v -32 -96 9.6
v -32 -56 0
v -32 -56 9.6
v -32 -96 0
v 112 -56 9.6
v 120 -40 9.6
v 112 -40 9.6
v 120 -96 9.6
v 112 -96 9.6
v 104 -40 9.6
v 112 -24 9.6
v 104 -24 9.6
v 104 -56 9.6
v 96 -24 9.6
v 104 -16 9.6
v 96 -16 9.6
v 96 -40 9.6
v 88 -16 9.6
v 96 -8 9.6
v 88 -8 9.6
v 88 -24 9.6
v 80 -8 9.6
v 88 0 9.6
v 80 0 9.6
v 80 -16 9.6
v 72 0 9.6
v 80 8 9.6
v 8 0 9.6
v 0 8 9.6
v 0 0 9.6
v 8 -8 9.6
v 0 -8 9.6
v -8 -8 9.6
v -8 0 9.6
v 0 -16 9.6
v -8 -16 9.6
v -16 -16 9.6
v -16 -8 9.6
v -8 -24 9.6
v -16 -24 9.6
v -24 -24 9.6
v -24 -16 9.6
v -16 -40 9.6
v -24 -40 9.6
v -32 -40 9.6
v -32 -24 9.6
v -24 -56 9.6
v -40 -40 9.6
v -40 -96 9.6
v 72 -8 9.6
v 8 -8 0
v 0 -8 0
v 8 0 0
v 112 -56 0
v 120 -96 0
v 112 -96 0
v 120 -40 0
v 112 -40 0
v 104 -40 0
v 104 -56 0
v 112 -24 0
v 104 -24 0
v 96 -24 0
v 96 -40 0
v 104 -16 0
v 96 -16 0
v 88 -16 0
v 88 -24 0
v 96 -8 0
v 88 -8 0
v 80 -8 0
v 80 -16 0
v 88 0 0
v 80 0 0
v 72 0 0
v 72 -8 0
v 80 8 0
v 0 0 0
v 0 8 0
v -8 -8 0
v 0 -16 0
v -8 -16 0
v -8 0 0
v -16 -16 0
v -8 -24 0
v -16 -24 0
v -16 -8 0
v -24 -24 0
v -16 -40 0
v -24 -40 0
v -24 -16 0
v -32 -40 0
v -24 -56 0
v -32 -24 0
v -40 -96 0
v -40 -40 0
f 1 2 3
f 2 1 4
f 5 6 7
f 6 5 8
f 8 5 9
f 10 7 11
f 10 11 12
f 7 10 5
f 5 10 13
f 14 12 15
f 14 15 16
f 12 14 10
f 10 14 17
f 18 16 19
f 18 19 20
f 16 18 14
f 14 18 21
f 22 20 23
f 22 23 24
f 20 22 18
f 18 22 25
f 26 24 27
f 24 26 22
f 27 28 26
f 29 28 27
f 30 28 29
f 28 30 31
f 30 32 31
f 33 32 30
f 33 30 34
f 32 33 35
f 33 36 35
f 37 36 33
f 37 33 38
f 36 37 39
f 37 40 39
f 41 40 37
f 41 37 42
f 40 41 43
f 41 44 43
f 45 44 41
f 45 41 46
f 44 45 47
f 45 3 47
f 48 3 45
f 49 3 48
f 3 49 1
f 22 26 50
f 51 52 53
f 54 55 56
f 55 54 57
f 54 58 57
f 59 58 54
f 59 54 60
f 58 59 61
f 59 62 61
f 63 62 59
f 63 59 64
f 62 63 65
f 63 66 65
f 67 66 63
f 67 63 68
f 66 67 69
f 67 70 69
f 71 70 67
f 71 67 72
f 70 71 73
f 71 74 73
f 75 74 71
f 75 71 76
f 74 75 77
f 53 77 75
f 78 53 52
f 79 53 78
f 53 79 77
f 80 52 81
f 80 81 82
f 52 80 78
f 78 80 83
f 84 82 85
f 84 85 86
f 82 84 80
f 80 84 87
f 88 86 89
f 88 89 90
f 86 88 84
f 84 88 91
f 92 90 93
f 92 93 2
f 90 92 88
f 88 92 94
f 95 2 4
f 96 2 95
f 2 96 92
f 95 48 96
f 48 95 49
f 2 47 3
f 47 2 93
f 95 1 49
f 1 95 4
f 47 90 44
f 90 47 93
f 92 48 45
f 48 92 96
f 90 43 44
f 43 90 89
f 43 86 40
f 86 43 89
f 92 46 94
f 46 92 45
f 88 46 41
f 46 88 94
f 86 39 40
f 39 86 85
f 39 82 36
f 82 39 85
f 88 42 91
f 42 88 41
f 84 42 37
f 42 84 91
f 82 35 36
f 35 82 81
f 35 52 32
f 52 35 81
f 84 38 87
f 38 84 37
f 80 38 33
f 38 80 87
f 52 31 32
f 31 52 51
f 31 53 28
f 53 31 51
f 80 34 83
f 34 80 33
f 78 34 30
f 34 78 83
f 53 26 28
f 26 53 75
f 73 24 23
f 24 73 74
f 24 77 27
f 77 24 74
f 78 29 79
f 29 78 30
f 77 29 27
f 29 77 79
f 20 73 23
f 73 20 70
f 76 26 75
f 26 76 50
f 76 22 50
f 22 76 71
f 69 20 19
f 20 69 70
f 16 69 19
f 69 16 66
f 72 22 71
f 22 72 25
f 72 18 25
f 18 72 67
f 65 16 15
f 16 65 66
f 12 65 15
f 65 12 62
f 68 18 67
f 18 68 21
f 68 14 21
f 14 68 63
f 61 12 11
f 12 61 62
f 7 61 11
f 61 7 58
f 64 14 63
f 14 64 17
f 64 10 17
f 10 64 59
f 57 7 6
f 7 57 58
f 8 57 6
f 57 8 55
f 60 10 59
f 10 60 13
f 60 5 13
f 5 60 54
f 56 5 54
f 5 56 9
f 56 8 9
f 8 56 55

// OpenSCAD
u = 8;
a = 9.6;

translate([-5*u, -12*u]) cube([1 * u, 5*u, 1 * a]);
translate([-5*u, -7*u]) cube([2 * u, 2*u, 1 * a]);
translate([-4*u, -5*u]) cube([2 * u, 2*u, 1 * a]);
translate([-3*u, -3*u]) cube([2 * u, 1*u, 1 * a]);
translate([-2*u, -2*u]) cube([2 * u, 1*u, 1 * a]);
translate([-1*u, -1*u]) cube([2 * u, 1*u, 1 * a]);
cube([10 * u, 1 * u, 1* a]);
translate([9*u, -1*u]) cube([2 * u, 1*u, 1 * a]);
translate([10*u, -2*u]) cube([2 * u, 1*u, 1 * a]);
translate([11*u, -3*u]) cube([2 * u, 1*u, 1 * a]);
translate([12*u, -5*u]) cube([2 * u, 2*u, 1 * a]);
translate([13*u, -7*u]) cube([2 * u, 2*u, 1 * a]);
translate([14*u, -12*u]) cube([1 * u, 5*u, 1 * a]);
